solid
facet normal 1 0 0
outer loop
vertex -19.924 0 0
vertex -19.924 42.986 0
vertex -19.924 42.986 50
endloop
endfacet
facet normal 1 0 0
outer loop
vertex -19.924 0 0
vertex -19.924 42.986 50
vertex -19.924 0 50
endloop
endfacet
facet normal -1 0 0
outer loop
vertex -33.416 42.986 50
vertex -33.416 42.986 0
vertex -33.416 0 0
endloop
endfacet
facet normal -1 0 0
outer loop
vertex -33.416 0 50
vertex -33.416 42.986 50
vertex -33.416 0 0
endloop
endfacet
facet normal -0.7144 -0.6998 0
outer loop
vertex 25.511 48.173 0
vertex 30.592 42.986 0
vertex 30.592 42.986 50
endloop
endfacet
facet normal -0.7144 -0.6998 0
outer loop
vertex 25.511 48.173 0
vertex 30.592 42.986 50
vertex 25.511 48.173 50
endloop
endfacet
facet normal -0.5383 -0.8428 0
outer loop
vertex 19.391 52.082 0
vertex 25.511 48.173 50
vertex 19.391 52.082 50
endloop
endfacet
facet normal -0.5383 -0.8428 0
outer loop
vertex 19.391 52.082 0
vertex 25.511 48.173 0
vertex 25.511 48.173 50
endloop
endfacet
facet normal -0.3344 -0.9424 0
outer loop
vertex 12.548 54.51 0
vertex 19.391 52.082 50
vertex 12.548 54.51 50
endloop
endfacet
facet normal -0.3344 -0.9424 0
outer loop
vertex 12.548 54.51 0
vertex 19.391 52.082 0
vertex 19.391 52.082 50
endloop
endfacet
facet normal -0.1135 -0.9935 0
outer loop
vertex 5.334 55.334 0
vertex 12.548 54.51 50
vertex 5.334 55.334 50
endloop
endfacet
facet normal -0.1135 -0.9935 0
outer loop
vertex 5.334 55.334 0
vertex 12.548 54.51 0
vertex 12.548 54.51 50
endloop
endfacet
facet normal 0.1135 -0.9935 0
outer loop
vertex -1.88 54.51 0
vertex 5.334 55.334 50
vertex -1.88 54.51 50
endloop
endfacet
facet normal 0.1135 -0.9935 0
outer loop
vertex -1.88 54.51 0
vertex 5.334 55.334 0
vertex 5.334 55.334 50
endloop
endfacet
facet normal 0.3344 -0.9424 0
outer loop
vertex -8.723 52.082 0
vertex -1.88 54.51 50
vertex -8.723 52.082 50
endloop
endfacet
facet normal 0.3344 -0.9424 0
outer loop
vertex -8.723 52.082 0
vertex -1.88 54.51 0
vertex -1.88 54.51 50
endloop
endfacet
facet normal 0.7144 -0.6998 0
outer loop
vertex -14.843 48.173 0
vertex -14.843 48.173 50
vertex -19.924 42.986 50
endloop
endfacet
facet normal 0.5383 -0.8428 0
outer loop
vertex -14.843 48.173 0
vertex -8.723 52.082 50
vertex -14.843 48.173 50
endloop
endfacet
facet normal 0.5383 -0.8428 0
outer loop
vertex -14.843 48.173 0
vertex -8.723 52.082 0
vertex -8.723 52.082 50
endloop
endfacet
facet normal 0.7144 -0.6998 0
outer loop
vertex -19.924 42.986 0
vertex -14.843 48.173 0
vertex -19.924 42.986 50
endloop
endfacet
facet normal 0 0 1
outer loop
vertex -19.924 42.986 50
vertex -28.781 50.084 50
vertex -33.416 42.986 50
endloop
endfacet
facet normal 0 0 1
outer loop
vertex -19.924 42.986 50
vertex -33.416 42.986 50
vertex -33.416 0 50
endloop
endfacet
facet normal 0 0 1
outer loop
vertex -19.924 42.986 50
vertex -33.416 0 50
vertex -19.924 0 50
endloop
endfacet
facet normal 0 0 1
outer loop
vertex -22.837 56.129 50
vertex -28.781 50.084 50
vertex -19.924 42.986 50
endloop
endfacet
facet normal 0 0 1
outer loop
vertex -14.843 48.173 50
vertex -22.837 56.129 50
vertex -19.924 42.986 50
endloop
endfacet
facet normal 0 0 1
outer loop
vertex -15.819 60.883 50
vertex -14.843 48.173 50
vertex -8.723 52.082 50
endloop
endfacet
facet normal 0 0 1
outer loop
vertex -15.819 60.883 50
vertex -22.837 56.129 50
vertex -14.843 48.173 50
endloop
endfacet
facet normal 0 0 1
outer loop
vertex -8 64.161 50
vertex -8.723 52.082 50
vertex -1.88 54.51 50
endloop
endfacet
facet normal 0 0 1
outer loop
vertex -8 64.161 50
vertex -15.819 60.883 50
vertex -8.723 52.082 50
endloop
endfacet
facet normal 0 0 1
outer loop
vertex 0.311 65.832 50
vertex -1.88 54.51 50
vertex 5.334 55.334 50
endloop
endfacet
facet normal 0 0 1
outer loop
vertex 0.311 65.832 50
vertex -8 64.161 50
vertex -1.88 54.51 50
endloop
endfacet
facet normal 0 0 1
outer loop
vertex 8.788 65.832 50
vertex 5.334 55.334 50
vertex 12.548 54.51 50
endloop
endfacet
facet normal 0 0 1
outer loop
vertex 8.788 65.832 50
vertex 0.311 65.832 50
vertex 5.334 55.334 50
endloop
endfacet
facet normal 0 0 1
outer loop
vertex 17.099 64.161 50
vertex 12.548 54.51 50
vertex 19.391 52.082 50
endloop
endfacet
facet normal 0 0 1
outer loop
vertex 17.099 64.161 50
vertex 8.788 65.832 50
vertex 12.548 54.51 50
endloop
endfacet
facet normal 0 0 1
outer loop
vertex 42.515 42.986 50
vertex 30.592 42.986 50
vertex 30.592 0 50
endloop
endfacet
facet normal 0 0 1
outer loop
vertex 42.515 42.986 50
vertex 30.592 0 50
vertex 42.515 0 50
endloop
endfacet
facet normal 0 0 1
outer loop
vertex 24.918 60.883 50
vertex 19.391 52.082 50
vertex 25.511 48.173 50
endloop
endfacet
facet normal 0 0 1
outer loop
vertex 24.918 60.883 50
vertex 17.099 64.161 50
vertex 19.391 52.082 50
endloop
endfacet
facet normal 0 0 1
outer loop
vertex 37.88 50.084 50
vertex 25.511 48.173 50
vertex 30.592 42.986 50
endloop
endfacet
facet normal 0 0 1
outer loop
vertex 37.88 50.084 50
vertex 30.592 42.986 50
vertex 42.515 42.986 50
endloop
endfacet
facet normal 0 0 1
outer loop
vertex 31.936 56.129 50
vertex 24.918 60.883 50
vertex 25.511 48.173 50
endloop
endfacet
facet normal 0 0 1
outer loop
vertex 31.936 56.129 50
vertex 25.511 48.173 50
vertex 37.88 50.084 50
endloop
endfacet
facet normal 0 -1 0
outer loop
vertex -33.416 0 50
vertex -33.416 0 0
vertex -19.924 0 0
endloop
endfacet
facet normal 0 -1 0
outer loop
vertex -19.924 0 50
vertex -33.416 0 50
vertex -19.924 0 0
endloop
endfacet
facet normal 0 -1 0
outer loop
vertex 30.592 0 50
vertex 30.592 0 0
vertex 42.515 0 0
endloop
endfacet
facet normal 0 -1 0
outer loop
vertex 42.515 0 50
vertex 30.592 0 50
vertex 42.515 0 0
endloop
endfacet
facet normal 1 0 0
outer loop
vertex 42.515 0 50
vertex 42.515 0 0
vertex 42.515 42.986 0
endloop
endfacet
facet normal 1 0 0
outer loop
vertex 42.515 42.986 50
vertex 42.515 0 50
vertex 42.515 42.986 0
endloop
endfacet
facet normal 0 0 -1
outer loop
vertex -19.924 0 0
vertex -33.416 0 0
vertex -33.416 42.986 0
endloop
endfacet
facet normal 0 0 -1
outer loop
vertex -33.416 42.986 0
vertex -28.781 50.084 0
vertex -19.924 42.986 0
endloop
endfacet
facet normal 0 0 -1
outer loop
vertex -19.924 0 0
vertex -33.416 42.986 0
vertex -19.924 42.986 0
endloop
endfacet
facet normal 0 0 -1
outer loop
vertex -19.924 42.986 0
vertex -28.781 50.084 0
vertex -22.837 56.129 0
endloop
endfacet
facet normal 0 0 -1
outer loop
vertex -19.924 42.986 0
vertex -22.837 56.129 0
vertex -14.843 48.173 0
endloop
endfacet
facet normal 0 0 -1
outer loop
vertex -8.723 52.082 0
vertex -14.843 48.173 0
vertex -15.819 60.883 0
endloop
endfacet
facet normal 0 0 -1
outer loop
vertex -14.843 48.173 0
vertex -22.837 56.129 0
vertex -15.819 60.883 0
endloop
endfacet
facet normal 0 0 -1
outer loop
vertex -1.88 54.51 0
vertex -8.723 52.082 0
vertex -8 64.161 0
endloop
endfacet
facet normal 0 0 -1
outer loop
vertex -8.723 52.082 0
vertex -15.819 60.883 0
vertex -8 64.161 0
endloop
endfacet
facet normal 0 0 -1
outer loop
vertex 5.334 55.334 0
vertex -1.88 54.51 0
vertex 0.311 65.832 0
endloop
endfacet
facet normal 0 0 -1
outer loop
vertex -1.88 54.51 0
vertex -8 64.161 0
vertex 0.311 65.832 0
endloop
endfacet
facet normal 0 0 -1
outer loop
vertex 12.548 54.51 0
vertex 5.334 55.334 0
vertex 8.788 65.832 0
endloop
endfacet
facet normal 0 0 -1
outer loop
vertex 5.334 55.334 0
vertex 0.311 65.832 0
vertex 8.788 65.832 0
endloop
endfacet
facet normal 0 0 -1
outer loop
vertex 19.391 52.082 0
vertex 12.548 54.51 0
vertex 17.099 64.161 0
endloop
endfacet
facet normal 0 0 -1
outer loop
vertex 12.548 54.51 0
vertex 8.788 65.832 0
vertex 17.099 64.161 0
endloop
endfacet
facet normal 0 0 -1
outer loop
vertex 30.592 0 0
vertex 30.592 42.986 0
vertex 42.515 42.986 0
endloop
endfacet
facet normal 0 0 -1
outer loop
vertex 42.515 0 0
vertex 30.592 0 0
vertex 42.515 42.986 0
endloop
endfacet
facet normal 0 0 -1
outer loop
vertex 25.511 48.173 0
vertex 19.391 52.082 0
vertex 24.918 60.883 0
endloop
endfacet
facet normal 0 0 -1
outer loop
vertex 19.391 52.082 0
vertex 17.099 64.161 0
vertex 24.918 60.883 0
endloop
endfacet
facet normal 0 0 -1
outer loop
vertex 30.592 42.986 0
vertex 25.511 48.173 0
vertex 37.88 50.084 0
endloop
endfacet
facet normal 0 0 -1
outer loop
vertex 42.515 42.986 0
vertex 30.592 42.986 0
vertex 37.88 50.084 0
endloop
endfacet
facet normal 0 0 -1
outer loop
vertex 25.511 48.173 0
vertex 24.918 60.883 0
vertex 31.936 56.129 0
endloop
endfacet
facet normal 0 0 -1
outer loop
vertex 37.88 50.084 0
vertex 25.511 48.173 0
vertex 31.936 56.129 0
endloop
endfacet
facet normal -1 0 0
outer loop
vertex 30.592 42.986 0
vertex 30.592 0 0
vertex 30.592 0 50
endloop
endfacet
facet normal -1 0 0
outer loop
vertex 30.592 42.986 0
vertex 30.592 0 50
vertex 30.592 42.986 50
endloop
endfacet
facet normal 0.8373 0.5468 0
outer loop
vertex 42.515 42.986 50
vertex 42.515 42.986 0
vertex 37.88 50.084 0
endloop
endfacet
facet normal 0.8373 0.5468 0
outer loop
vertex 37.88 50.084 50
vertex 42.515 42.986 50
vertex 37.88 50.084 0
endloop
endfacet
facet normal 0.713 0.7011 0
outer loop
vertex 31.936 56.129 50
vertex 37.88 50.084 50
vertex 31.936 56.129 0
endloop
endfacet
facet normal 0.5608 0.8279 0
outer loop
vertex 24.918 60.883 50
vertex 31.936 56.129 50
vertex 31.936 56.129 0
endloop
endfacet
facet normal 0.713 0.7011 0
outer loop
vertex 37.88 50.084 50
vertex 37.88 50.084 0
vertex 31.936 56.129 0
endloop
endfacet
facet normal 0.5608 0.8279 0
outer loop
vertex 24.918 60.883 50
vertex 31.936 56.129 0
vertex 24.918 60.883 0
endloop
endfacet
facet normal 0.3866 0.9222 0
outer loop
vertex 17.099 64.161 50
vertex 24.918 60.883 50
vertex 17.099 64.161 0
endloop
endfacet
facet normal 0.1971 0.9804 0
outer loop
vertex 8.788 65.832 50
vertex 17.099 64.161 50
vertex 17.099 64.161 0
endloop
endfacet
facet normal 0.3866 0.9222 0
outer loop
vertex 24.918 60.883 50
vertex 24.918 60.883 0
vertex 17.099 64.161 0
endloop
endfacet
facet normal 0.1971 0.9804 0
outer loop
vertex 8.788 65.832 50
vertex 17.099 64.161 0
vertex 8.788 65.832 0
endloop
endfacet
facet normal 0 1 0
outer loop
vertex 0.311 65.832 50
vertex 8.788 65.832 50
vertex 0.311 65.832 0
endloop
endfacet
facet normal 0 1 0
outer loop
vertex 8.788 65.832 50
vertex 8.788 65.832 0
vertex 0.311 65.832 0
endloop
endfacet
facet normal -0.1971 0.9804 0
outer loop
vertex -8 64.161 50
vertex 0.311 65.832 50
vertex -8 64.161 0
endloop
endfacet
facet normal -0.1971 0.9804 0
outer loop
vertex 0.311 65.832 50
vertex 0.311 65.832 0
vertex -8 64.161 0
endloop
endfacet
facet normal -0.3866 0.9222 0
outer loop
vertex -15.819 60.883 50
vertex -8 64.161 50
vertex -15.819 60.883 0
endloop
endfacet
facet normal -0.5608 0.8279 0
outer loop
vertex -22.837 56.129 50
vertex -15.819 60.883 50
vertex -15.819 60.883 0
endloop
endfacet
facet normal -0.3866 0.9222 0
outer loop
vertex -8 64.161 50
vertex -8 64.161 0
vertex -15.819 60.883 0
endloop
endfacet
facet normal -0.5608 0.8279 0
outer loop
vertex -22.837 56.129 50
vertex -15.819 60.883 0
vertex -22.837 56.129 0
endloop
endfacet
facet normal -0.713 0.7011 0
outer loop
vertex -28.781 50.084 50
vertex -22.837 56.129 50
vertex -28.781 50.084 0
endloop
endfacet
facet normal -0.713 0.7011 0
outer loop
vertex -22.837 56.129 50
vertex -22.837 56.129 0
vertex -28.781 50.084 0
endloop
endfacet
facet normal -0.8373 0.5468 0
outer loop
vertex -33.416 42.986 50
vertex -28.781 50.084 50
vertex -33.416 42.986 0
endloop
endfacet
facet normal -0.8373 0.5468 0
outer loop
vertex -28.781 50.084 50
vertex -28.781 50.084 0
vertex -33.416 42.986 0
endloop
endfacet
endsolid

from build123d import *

# Parameters (mm, degrees)
F1_DEPTH = 50
F2_DEPTH = 50.001


with BuildPart() as f1:
    # F0 (on Top) → F1 (new body)
    with BuildSketch(Plane.XY):
        with BuildLine():
            Line((-33.415943, 42.985767), (-33.415943, 0))
            Line((-33.415943, 0), (-19.92406, 0))
            Line((-19.92406, 0), (-19.92406, 42.985767))
            ThreePointArc((-19.92406, 42.985767), (5.333999, 55.333899), (30.592058, 42.985767))
            Line((30.592058, 42.985767), (30.592058, 0))
            Line((30.592058, 0), (42.515114, 0))
            Line((42.515114, 0), (42.515114, 42.985767))
            ThreePointArc((42.515114, 42.985767), (4.549585, 66.042514), (-33.415943, 42.985767))
        make_face()
        with BuildLine():
            Line((-19.92406, 42.985767), (-19.92406, 0))
            Line((-19.92406, 0), (30.592058, 0))
            Line((30.592058, 0), (30.592058, 42.985767))
            ThreePointArc((30.592058, 42.985767), (5.333999, 55.333899), (-19.92406, 42.985767))
        make_face()
    extrude(amount=F1_DEPTH)

    # F0 (on Top) → F2 (cut, through all)
    with BuildSketch(Plane.XY):
        with BuildLine():
            Line((-19.92406, 42.985767), (-19.92406, 0))
            Line((-19.92406, 0), (30.592058, 0))
            Line((30.592058, 0), (30.592058, 42.985767))
            ThreePointArc((30.592058, 42.985767), (5.333999, 55.333899), (-19.92406, 42.985767))
        make_face()
    extrude(amount=F2_DEPTH, mode=Mode.SUBTRACT)


solid = f1.part
